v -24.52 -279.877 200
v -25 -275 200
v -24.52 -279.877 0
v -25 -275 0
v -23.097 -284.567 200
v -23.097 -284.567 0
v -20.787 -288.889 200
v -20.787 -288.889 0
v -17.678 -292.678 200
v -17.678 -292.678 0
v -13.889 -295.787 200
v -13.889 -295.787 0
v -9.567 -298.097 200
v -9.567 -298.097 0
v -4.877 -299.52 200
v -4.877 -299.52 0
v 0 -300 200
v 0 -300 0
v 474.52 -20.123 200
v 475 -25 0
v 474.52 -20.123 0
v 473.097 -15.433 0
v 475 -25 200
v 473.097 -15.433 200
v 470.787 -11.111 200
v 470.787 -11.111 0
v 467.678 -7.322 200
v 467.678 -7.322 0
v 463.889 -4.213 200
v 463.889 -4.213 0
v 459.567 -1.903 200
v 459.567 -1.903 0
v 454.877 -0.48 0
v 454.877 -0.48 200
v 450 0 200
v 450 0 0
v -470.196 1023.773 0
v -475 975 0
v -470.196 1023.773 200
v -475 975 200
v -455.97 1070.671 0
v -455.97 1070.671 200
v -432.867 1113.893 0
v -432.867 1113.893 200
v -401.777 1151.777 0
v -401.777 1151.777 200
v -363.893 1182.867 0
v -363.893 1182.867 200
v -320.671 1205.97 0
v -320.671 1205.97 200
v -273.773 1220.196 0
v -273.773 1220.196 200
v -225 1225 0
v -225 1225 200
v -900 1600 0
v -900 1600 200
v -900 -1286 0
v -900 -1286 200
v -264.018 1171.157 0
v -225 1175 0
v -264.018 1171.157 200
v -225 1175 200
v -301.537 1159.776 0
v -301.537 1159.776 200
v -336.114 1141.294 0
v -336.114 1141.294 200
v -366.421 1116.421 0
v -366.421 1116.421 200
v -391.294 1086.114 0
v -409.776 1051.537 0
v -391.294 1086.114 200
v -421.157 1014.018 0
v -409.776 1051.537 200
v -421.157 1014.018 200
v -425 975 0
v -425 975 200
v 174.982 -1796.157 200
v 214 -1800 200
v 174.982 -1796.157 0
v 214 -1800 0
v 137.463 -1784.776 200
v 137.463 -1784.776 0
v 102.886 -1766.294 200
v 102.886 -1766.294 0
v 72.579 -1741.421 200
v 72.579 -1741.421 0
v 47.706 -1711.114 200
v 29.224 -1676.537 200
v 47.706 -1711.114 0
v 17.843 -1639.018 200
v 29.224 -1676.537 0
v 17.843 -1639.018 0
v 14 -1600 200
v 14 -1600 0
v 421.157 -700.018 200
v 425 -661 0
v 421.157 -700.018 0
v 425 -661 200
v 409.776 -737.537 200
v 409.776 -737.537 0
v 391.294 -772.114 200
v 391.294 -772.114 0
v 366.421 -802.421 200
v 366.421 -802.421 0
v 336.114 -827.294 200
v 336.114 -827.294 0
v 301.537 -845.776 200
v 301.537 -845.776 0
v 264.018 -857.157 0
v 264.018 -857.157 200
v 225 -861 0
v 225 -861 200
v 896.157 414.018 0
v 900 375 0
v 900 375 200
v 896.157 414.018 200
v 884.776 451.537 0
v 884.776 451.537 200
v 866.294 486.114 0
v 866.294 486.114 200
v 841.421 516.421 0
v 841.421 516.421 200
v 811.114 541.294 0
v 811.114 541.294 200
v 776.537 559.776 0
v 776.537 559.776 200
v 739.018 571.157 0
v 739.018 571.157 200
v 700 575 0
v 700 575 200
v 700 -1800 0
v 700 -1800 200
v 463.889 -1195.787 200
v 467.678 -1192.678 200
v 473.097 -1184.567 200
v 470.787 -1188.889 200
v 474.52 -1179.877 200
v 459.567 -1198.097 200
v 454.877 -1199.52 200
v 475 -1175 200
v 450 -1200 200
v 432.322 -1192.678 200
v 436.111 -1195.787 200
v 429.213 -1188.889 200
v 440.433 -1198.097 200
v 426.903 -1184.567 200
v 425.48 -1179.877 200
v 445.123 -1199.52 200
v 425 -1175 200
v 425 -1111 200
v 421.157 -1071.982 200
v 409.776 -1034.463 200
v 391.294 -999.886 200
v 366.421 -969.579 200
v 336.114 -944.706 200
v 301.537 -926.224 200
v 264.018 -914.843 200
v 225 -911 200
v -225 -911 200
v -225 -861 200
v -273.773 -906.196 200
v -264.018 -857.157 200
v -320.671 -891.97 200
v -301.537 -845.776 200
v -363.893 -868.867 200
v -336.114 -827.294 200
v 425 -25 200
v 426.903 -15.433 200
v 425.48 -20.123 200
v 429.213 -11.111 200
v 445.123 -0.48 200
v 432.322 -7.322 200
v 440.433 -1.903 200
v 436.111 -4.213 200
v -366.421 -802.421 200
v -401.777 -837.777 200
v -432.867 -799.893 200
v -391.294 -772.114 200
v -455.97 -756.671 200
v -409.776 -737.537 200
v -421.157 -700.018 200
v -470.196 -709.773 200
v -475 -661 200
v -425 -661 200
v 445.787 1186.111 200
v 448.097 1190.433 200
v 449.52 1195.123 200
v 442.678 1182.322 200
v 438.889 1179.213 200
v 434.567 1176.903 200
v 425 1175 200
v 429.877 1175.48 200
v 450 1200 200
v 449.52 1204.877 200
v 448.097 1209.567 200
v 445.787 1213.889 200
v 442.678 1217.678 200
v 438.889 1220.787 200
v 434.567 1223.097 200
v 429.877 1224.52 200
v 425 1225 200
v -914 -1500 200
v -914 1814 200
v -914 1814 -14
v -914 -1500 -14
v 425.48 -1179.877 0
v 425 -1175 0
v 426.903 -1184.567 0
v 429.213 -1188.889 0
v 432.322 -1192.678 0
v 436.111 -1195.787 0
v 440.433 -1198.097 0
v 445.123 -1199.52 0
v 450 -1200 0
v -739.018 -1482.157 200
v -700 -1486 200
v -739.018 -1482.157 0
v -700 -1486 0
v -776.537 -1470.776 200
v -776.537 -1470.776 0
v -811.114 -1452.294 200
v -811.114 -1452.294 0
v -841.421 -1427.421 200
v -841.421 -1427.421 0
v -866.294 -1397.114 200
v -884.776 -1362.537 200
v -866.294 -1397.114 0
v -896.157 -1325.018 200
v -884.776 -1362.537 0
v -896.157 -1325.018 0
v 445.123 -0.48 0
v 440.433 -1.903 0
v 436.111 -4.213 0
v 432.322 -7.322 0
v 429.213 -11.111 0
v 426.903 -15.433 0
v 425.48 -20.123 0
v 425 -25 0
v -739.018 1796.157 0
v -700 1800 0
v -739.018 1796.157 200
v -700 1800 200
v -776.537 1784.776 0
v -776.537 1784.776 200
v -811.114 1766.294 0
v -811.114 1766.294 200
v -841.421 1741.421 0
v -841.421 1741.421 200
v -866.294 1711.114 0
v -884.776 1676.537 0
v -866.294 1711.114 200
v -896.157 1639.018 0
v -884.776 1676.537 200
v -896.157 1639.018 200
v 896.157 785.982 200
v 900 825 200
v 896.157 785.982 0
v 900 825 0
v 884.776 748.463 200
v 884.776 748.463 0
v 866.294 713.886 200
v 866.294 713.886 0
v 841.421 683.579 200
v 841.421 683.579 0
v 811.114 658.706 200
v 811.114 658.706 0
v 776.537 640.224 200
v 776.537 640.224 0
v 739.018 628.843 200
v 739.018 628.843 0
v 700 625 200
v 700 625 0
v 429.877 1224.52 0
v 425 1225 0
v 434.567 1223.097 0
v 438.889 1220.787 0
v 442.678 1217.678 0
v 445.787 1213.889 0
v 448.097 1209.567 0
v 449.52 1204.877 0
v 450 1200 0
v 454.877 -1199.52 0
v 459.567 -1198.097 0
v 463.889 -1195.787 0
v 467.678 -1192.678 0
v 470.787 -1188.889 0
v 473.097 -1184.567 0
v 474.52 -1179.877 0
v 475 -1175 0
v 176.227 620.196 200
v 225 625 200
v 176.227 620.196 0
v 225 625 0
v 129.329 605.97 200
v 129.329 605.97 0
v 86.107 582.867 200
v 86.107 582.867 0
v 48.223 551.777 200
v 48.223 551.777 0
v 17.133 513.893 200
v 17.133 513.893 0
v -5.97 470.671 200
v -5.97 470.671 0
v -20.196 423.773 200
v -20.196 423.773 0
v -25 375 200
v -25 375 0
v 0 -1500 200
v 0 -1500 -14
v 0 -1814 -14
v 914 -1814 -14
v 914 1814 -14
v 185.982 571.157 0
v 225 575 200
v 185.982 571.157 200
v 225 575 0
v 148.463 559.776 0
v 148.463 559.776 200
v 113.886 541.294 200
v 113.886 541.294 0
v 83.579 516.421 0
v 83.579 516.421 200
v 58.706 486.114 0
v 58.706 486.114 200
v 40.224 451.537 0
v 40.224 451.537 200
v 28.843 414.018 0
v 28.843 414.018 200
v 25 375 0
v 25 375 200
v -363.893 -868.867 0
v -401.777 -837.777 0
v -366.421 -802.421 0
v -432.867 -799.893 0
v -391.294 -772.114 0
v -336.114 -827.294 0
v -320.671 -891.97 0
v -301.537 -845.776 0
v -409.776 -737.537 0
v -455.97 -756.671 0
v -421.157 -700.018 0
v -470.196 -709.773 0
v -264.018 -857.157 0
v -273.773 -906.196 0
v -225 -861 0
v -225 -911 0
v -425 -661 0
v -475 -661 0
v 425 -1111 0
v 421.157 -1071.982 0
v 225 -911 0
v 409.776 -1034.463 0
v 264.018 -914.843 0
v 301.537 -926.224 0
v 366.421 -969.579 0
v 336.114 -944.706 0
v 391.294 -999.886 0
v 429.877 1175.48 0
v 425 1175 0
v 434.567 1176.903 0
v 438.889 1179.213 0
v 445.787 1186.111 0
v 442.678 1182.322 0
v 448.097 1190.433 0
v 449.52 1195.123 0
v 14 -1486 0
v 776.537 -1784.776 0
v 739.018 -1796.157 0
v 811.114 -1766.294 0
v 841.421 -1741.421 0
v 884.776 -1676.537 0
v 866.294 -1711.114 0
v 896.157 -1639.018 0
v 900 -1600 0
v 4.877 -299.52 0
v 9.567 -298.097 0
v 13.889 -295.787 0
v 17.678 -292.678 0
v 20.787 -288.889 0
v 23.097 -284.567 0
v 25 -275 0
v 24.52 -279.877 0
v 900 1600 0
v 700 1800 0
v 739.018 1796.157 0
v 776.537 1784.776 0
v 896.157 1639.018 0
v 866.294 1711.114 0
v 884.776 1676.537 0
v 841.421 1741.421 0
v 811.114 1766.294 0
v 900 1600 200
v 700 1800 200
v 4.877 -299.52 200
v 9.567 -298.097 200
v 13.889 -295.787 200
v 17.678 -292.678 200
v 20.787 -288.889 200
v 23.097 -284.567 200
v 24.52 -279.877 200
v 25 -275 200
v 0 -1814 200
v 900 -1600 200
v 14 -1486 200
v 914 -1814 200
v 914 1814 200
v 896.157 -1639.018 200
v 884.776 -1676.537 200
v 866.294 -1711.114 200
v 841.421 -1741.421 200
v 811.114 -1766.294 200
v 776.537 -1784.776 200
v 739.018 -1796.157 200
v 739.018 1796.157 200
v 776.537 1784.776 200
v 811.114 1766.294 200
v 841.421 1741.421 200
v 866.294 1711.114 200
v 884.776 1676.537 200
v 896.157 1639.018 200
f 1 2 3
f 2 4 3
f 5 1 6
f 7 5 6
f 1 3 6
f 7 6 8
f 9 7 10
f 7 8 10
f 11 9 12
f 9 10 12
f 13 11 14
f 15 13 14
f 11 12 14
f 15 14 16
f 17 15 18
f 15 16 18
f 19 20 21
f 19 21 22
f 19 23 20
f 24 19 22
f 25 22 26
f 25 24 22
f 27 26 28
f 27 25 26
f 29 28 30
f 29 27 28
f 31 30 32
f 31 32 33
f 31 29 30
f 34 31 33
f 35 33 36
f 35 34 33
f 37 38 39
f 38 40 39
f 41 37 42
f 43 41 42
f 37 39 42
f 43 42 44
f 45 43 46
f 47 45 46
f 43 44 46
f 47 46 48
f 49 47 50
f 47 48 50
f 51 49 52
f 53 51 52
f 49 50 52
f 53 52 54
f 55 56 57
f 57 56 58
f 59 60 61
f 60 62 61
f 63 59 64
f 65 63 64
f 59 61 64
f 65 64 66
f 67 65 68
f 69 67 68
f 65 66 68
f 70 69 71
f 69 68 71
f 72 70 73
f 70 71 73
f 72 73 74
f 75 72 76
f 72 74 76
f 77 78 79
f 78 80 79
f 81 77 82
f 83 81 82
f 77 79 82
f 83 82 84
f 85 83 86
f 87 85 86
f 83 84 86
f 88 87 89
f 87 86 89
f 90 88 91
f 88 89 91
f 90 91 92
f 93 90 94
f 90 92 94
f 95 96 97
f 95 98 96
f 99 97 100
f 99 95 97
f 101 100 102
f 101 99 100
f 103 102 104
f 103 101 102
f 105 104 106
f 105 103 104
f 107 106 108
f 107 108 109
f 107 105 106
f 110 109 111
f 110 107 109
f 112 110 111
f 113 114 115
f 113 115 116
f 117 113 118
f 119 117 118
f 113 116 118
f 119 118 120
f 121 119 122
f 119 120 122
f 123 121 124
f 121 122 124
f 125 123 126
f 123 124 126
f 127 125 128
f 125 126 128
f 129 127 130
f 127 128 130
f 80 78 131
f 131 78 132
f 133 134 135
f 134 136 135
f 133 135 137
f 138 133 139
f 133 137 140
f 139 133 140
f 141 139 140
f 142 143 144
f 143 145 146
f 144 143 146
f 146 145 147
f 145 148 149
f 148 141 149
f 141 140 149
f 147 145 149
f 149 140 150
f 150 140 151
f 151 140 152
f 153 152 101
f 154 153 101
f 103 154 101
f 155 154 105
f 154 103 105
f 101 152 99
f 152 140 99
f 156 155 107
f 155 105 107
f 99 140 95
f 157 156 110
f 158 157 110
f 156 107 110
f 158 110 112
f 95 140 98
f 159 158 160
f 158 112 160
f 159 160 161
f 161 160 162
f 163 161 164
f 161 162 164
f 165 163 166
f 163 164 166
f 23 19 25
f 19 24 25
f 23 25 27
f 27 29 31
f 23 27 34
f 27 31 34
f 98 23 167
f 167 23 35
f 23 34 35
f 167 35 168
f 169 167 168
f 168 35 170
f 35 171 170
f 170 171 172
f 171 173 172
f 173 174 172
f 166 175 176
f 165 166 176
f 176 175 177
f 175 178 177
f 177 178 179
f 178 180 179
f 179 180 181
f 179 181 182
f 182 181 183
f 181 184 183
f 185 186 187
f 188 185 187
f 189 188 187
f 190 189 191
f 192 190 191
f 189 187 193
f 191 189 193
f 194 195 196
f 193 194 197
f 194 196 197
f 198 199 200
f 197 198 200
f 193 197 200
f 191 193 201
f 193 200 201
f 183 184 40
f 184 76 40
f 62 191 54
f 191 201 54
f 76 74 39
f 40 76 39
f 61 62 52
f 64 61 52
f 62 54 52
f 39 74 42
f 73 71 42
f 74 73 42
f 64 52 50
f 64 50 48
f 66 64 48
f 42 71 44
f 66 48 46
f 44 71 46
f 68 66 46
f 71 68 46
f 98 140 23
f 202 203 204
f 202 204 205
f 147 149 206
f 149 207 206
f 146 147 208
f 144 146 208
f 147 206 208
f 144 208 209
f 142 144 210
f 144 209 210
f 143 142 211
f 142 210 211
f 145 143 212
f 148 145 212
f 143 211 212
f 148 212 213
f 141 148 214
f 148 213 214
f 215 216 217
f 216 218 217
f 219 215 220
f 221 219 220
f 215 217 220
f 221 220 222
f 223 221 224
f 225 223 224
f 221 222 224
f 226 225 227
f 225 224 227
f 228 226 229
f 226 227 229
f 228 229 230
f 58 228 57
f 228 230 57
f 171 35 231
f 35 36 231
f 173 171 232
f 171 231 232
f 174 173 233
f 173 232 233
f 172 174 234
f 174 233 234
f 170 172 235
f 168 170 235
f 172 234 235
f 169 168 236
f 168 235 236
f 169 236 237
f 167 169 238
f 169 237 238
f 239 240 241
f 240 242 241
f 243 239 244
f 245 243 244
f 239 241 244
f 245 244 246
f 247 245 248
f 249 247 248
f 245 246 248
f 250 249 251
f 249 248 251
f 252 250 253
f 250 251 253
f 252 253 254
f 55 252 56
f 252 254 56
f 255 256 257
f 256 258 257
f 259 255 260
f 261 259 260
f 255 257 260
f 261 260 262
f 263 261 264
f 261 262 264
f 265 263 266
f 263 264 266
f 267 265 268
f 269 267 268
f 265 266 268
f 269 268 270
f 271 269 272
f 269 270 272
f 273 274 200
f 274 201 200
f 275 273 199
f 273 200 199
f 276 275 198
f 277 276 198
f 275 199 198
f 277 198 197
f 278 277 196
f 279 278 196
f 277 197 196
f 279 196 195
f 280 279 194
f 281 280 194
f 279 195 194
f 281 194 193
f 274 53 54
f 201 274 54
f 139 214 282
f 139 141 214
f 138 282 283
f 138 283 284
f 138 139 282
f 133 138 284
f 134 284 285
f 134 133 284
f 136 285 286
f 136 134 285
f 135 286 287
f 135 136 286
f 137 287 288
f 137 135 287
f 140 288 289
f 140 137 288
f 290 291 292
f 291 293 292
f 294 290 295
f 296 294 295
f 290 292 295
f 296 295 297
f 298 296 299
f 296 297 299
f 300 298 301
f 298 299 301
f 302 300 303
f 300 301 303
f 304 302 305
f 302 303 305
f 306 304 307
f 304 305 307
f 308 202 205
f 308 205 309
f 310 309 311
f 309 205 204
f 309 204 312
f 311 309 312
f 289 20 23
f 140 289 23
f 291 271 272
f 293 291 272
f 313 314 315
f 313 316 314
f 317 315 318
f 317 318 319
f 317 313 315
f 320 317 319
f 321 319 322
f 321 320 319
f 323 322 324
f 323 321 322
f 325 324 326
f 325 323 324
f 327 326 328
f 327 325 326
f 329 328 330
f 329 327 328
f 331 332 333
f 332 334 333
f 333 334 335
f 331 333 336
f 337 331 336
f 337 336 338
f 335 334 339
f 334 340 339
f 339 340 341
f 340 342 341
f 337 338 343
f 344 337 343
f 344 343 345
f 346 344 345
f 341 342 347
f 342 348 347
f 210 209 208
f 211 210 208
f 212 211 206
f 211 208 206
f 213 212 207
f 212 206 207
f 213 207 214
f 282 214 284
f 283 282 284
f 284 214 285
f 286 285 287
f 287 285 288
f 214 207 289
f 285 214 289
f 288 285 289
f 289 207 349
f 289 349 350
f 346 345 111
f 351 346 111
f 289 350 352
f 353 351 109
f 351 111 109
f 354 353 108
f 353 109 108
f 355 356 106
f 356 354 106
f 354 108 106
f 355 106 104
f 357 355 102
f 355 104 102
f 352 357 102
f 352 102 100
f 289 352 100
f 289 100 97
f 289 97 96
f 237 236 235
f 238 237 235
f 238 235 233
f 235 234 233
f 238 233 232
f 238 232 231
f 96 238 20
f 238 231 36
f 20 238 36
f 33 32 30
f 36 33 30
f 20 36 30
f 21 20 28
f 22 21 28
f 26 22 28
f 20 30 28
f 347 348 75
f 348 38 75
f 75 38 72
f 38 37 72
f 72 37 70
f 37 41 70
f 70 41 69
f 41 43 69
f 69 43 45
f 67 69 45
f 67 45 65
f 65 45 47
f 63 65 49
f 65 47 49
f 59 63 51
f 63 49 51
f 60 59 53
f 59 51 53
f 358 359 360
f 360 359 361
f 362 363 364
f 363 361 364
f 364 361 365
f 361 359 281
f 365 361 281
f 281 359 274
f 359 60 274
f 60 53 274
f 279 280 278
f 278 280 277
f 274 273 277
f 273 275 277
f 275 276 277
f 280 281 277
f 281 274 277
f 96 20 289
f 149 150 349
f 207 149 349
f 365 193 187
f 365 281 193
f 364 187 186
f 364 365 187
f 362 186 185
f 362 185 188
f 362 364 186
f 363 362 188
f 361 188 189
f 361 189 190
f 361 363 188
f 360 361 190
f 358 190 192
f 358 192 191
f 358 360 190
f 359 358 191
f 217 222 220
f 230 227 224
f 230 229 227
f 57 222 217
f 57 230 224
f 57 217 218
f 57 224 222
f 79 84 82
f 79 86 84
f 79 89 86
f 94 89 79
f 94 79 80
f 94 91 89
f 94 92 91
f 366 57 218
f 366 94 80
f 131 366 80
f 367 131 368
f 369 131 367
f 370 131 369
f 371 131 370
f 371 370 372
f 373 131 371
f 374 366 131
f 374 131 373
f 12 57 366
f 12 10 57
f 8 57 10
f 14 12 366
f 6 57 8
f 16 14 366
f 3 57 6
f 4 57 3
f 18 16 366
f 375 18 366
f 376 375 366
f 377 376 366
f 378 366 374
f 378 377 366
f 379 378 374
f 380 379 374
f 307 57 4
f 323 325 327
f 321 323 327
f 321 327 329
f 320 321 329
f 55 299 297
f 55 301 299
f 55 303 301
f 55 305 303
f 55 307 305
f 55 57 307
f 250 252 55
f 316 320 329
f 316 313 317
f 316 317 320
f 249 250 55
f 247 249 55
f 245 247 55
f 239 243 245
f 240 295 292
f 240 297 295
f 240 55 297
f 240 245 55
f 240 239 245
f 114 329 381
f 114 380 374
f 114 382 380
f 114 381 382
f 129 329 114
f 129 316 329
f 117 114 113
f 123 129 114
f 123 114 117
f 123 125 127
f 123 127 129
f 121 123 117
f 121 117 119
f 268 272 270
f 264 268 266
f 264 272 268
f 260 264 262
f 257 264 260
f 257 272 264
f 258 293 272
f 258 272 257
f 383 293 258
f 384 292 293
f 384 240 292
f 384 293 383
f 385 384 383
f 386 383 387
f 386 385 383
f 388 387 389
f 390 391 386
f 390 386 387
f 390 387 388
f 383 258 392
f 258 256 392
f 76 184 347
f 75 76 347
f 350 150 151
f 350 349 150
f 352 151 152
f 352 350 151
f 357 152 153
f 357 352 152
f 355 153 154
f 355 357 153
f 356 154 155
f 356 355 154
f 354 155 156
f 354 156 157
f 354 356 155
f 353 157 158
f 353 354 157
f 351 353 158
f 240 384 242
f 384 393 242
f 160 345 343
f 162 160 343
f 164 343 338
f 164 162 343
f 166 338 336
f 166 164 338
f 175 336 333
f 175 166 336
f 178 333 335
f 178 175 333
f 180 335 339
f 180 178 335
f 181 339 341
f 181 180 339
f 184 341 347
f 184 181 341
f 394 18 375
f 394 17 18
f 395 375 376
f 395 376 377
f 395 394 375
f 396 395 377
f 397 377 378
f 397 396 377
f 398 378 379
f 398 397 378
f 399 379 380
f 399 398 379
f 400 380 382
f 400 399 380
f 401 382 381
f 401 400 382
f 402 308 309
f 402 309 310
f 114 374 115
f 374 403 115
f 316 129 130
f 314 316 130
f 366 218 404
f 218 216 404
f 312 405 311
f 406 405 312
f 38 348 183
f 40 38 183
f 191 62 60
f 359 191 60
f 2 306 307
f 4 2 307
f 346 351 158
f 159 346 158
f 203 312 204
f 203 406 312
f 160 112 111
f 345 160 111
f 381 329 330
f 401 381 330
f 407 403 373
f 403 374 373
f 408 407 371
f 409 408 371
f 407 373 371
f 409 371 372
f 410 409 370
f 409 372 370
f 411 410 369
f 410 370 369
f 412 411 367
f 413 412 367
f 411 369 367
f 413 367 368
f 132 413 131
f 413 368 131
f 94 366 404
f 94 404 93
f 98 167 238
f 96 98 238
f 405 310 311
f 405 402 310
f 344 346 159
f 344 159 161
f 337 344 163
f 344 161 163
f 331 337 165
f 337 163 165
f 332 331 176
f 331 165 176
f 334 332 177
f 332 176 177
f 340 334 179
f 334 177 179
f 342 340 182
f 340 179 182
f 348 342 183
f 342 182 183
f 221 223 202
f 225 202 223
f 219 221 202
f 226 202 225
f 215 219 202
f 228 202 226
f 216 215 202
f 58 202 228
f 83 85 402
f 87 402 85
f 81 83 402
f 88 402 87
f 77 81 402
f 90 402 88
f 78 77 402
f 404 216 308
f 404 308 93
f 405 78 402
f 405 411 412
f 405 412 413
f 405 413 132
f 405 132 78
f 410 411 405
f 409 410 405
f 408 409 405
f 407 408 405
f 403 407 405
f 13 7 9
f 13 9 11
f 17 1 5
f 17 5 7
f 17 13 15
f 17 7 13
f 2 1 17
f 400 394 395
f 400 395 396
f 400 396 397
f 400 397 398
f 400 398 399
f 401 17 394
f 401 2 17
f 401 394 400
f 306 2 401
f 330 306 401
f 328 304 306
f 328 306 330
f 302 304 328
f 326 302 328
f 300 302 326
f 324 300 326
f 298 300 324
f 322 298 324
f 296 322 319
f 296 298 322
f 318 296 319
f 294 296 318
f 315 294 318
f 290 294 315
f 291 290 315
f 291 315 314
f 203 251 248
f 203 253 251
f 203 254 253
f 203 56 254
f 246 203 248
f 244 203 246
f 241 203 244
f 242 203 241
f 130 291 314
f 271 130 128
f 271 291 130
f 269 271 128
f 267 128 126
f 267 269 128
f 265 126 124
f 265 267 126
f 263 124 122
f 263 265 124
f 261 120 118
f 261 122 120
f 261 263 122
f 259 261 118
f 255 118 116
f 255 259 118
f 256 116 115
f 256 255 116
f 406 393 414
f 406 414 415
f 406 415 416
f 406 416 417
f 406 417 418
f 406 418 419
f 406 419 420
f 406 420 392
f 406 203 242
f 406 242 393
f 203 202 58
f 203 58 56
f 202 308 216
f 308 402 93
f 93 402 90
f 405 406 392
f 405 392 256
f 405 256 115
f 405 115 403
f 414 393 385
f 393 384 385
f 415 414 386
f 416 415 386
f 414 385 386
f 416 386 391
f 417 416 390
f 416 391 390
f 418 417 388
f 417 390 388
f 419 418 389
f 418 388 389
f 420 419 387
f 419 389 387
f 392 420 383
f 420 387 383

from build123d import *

# Parameters (mm, degrees)
F6_DEPTH      = 200
F6_DEPTH_BACK = 14
F7_T          = -14
F12_W         = 50
F12_H         = 200
F13_W         = 50
F13_H         = 200
F14_W         = 50
F14_H         = 200
F19_R         = 200
F19_2_R       = 200
F20_R         = 250
F20_2_R       = 250
F21_R         = 24.99999
F21_2_R       = 24.99999


# Not quite as in the source:
# - a fillet or chamfer is up to 0.001 mm smaller than in the source, because OpenCascade refuses the exact size


with BuildPart() as f6:
    # F5 (on Top) → F6 (new body, two sides)
    with BuildSketch(Plane.XY) as f6_sk:
        Polygon((914, 1814), (-914, 1814), (-914, -1500), (0, -1500), (0, -1814), (914, -1814), align=None)
    extrude(amount=F6_DEPTH)
    extrude(f6_sk.sketch, amount=-F6_DEPTH_BACK)

    # F7
    f7_openings = [f6.faces().sort_by_distance(p)[0] for p in [
        (20.670988, 74.949294, 200),
    ]]
    offset(amount=F7_T, openings=f7_openings, kind=Kind.INTERSECTION)

    # F17: sweep along a path in F8
    with BuildLine(Plane.XY) as f17_path:
        Line((0, -300), (0, 600))
        Line((0, 600), (900, 600))
    # F14 (on plane+point) → F17 (sweep)
    with BuildSketch(Plane.XZ.offset(300)):
        with Locations((0, 100)):
            Rectangle(F14_W, F14_H)
    sweep(path=f17_path.line, transition=Transition.RIGHT)

    # F19
    f19_edges = [f6.edges().sort_by_distance(p)[0] for p in [
        (25, 575, 100),
        (900, 575, 100),
        (900, 625, 100),
        (14, -1800, 100),
        (900, -1800, 100),
        (-900, -1486, 100),
        (-900, 1800, 100),
        (900, 1800, 100),
    ]]
    fillet(f19_edges, radius=F19_R)

    # F20
    f20_edges = [f6.edges().sort_by_distance(p)[0] for p in [
        (-25, 625, 100),
    ]]
    fillet(f20_edges, radius=F20_R)

    # F21 (radius 25 in the source; OpenCascade refuses exactly that, so slightly less here)
    f21_edges = [f6.edges().sort_by_distance(p)[0] for p in [
        (25, -300, 100),
        (-25, -300, 100),
    ]]
    fillet(f21_edges, radius=F21_R)


with BuildPart() as f15:
    # F15: sweep along a path in F8
    with BuildLine(Plane.XY) as f15_path:
        Line((450, 1200), (-450, 1200))
        Line((-450, 1200), (-450, -886))
        Line((-450, -886), (450, -886))
    # F12 (on plane+point) → F15 (sweep)
    with BuildSketch(Plane.YZ.offset(450)):
        with Locations((1200, 100)):
            Rectangle(F12_W, F12_H)
    sweep(path=f15_path.line, transition=Transition.RIGHT)

    # F16: sweep along a path in F8
    with BuildLine(Plane.XY) as f16_path:
        Line((450, -1200), (450, 0))
    # F13 (on plane+point) → F16 (sweep)
    with BuildSketch(Plane.XZ.offset(1200)):
        with Locations((450, 100)):
            Rectangle(F13_W, F13_H)
    sweep(path=f16_path.line)

    # F18: union 

    # F19#2
    f19_2_edges = [f15.edges().sort_by_distance(p)[0] for p in [
        (425, -861, 100),
        (-425, -861, 100),
        (-425, 1175, 100),
        (425, -911, 100),
    ]]
    fillet(f19_2_edges, radius=F19_2_R)

    # F20#2
    f20_2_edges = [f15.edges().sort_by_distance(p)[0] for p in [
        (-475, 1225, 100),
        (-475, -911, 100),
    ]]
    fillet(f20_2_edges, radius=F20_2_R)

    # F21#2 (radius 25 in the source; OpenCascade refuses exactly that, so slightly less here)
    f21_2_edges = [f15.edges().sort_by_distance(p)[0] for p in [
        (450, 1225, 100),
        (450, 1175, 100),
        (425, 0, 100),
        (475, 0, 100),
        (425, -1200, 100),
        (475, -1200, 100),
    ]]
    fillet(f21_2_edges, radius=F21_2_R)


solid = Compound([f6.part, f15.part])
